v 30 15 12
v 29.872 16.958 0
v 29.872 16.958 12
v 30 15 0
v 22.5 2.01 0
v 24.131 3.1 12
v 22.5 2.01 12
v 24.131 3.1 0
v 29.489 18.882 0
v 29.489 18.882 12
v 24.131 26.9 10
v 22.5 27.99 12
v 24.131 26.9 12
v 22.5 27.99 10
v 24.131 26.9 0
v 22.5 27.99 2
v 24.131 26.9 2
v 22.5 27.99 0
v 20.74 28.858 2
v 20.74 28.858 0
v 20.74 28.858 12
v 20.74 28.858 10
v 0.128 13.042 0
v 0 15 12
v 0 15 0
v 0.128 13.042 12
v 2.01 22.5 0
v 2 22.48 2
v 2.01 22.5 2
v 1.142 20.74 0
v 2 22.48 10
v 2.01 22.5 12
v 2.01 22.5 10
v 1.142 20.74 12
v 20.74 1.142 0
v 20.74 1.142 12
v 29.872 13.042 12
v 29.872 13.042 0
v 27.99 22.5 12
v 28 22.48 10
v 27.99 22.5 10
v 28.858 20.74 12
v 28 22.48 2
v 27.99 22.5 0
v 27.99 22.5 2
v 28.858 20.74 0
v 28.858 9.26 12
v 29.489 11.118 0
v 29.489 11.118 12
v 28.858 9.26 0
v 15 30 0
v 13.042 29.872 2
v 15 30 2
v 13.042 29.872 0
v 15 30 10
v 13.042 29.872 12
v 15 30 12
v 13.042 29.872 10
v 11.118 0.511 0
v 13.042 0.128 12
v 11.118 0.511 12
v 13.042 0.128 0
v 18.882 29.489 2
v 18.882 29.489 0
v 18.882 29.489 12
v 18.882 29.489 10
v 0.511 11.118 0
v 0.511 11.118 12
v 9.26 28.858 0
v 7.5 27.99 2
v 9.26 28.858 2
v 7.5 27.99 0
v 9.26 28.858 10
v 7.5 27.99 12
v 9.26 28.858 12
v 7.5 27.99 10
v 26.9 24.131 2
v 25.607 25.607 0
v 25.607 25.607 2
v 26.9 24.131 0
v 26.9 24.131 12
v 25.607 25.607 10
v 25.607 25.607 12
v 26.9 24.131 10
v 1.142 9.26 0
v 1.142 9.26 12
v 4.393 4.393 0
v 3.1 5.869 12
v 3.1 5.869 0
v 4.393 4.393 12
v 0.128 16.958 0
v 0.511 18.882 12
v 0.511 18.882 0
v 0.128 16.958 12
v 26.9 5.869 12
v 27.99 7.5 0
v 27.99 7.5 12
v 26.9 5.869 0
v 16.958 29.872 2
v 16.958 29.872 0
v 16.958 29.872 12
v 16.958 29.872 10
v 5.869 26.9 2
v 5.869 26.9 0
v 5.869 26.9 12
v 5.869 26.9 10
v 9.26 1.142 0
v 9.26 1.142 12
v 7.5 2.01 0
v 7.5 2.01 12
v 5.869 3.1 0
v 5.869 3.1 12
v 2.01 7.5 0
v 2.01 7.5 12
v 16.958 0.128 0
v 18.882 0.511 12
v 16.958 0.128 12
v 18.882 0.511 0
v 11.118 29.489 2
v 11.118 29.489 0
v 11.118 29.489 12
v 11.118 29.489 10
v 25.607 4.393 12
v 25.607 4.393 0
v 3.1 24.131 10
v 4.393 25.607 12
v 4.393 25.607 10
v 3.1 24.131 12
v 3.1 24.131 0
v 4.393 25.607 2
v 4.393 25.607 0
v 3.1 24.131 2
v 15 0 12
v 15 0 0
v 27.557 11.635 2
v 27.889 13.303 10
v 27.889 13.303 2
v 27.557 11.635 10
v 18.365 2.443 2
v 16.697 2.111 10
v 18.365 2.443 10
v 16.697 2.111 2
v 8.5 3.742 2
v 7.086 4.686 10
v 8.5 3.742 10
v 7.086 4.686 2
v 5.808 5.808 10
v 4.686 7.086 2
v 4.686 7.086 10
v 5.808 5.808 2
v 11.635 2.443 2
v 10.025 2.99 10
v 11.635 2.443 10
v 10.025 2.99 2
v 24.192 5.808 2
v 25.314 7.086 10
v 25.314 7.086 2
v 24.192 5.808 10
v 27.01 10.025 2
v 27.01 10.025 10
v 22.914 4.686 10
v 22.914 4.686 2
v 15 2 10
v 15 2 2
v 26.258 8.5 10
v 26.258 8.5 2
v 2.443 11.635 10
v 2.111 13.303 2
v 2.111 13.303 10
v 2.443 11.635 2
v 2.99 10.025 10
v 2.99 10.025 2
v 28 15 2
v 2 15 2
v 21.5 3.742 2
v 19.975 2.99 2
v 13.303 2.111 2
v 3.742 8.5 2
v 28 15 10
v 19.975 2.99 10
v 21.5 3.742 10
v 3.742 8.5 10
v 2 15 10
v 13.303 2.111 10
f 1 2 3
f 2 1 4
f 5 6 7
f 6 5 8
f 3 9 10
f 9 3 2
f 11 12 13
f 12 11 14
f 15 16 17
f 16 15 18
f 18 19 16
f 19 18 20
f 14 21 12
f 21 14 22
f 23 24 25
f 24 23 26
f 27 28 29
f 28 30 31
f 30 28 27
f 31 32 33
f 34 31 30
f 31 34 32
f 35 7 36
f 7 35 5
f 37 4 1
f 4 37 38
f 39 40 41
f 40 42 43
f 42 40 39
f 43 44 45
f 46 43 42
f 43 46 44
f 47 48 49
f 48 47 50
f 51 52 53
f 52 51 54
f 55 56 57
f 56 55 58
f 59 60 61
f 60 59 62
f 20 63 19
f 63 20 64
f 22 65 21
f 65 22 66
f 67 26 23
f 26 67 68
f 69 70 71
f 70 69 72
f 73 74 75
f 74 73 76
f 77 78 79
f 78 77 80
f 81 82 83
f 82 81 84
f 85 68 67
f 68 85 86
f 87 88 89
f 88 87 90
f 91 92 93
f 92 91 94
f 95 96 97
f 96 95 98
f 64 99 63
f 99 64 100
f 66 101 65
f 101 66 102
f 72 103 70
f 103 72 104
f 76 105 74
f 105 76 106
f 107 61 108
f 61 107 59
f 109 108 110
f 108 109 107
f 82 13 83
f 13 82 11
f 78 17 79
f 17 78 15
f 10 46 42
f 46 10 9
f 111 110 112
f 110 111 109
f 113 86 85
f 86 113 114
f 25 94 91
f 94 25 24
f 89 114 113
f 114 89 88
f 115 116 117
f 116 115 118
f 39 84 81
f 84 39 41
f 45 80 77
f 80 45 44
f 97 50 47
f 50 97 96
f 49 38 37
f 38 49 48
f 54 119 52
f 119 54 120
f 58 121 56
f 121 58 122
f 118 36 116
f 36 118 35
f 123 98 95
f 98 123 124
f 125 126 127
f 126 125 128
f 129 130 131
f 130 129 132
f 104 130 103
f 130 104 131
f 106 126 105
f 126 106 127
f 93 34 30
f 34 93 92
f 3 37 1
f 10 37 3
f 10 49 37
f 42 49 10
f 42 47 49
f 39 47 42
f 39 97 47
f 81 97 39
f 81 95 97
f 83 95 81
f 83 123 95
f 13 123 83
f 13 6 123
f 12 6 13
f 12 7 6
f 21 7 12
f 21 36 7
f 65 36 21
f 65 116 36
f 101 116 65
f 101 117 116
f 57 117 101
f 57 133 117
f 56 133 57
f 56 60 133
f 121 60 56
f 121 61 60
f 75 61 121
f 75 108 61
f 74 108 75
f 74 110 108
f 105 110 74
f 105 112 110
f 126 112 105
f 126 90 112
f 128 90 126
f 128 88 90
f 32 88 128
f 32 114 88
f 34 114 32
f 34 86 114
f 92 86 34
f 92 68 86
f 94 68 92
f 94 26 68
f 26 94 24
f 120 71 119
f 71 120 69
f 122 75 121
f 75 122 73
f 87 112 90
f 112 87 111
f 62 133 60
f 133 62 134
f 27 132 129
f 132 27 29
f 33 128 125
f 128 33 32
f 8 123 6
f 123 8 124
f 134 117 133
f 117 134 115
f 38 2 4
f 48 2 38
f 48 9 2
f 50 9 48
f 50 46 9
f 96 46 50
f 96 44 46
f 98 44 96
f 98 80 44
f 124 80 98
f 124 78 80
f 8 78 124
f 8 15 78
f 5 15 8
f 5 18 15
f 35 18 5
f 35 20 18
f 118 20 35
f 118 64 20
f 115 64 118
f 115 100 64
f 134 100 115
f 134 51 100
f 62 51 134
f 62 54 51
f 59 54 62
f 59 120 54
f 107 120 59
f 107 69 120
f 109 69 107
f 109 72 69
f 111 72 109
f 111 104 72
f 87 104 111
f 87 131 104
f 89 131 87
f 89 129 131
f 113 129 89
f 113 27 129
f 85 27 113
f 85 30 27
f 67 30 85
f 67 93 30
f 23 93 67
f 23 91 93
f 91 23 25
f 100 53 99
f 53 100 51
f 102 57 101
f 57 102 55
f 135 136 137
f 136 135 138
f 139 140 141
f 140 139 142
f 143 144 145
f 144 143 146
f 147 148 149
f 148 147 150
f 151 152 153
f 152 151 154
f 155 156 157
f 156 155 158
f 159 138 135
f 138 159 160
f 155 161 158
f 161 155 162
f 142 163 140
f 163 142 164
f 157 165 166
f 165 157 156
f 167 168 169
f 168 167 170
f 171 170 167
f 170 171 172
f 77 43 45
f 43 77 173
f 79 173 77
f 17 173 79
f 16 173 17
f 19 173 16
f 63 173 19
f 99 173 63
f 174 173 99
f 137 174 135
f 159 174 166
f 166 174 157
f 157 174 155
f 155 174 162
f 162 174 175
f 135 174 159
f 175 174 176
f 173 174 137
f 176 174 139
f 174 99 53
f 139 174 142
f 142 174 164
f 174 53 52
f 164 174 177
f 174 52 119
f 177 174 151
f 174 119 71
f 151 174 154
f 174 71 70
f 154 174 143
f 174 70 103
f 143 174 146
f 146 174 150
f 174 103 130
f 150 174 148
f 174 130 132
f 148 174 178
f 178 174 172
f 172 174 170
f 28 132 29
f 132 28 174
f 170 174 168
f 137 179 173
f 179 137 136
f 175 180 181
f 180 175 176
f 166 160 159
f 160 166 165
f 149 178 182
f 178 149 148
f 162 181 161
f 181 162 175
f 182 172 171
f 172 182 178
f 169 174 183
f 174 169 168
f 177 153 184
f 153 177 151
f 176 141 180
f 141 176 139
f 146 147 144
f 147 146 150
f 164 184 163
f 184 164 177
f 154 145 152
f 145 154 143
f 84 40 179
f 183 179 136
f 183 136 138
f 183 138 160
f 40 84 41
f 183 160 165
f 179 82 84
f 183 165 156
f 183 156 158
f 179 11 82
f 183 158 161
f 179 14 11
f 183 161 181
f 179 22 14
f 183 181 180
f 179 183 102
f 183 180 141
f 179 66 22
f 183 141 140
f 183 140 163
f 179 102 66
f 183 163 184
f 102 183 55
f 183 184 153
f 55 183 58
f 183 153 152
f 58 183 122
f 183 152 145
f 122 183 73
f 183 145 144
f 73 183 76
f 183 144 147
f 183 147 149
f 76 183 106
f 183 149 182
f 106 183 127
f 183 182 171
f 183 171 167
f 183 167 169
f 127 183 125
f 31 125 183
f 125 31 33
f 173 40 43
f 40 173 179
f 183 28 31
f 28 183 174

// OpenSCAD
// units=mm — generated by scad_emitter.py
// part=unnamed
$fn = 48;

difference() { translate([15, 15, 0]) cylinder(h=12, r=15, $fn=$fn); translate([15, 15, 2]) cylinder(h=8, r=13, $fn=$fn); translate([2, 15, 2]) cube([26, 15.5, 8]); }
